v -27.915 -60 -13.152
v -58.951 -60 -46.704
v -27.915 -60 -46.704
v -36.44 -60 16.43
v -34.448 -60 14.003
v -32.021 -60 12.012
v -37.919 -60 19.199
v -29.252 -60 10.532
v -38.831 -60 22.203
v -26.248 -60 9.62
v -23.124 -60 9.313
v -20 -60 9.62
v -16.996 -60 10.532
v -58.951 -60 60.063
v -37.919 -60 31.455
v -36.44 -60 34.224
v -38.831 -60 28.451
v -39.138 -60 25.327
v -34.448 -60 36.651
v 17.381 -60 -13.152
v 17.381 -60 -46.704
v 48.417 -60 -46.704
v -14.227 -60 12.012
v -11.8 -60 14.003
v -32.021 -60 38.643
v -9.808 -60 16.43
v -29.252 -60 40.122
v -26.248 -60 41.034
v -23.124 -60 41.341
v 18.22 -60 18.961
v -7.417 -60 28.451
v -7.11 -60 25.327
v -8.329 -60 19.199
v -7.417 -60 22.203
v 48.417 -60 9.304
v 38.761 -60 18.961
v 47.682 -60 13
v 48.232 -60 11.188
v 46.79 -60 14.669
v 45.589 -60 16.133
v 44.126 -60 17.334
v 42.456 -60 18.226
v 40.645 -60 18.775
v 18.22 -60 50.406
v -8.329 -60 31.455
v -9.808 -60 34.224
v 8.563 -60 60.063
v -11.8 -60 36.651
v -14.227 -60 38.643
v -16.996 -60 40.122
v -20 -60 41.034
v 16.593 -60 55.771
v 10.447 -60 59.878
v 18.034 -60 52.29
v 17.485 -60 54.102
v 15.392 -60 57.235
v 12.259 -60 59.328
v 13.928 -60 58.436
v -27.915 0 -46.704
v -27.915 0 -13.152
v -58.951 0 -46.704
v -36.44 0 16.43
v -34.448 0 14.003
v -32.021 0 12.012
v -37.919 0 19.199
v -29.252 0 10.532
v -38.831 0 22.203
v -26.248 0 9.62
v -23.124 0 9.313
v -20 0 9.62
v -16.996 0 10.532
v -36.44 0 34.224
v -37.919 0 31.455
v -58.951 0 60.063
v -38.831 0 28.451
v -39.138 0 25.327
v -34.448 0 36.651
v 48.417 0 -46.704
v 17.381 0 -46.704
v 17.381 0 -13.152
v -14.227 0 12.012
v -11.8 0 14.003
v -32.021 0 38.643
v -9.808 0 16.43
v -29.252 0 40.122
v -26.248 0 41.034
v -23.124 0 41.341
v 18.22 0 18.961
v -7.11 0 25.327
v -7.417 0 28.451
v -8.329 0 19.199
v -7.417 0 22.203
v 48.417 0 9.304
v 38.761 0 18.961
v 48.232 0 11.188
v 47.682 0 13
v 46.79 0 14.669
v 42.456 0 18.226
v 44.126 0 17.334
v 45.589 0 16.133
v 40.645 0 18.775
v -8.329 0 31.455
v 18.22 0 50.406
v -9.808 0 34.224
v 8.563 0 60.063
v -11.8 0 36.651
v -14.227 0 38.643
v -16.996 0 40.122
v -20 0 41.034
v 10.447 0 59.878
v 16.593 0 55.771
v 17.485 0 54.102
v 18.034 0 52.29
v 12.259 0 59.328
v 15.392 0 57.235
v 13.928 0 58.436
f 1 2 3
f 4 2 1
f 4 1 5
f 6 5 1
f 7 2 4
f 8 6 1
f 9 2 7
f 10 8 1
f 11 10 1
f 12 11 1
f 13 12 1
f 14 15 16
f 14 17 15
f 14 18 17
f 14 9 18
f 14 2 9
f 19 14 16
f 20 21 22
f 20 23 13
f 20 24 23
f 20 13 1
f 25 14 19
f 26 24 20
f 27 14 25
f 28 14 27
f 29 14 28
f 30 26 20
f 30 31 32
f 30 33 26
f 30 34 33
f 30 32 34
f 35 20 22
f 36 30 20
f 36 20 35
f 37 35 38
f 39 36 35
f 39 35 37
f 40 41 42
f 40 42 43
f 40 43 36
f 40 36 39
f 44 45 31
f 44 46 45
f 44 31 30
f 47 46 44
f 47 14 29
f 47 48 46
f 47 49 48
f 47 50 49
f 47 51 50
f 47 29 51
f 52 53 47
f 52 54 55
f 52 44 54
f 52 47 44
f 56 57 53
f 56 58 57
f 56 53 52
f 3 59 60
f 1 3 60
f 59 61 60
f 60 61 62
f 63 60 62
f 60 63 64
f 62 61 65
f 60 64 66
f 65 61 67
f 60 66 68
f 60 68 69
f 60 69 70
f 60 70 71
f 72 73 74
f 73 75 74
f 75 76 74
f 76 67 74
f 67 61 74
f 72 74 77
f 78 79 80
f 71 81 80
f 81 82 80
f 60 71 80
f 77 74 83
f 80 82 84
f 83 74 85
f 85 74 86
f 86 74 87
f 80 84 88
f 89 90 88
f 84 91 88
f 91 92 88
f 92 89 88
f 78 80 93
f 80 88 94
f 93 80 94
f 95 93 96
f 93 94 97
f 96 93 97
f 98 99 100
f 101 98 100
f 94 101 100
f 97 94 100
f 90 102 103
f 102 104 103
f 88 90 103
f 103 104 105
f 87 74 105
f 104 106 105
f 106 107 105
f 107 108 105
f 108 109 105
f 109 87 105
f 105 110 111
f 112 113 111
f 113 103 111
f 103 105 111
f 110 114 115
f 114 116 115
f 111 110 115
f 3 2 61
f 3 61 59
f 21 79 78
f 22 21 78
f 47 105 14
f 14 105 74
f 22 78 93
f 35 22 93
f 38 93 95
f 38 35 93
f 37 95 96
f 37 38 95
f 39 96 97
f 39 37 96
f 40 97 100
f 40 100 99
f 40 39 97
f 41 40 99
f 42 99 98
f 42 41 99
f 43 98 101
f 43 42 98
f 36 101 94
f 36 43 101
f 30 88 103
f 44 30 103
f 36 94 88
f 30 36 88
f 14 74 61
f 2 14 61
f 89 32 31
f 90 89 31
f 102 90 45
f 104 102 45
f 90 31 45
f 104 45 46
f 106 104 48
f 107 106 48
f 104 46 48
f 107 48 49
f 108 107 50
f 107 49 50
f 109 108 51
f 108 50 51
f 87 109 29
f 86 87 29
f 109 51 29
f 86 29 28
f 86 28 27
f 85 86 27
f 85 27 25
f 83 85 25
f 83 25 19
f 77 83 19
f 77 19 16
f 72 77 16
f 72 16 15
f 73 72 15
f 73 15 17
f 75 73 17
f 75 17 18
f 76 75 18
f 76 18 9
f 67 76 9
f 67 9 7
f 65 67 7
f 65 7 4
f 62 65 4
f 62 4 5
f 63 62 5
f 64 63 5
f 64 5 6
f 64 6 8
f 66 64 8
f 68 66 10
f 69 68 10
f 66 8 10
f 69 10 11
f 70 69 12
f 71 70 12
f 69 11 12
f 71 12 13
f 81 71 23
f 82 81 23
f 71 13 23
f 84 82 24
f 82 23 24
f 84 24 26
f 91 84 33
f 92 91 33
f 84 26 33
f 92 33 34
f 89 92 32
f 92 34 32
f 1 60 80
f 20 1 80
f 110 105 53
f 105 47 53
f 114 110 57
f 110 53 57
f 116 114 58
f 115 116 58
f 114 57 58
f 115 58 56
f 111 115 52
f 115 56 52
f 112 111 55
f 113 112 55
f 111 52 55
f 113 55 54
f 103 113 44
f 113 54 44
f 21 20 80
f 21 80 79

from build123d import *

# Parameters (mm, degrees)
F1_DEPTH = 60
F2_R     = 9.656854
F3_R     = 16.014444
F4_DEPTH = 101


with BuildPart() as f1:
    # F0 (on Front) → F1 (new body)
    with BuildSketch(Plane.XZ):
        Polygon((18.220022, 60.063125), (-58.951251, 60.063125), (-58.951251, -46.7043), (-27.914977, -46.7043), (-27.914977, -13.151571), (17.381208, -13.151571), (17.381208, -46.7043), (48.417483, -46.7043), (48.417483, 18.961032), (18.220022, 18.961032), align=None)
    extrude(amount=F1_DEPTH)

    # F2
    f2_edges = [f1.edges().sort_by_distance(p)[0] for p in [
        (18.220022, -30, 60.063125),
        (48.417483, -30, 18.961032),
    ]]
    fillet(f2_edges, radius=F2_R)

    # F3 (on face) → F4 (cut)
    with BuildSketch(Plane.XZ.offset(60)):
        with Locations((-23.123993, 25.327024)):
            Circle(F3_R)
    extrude(amount=-F4_DEPTH, mode=Mode.SUBTRACT)


solid = f1.part
